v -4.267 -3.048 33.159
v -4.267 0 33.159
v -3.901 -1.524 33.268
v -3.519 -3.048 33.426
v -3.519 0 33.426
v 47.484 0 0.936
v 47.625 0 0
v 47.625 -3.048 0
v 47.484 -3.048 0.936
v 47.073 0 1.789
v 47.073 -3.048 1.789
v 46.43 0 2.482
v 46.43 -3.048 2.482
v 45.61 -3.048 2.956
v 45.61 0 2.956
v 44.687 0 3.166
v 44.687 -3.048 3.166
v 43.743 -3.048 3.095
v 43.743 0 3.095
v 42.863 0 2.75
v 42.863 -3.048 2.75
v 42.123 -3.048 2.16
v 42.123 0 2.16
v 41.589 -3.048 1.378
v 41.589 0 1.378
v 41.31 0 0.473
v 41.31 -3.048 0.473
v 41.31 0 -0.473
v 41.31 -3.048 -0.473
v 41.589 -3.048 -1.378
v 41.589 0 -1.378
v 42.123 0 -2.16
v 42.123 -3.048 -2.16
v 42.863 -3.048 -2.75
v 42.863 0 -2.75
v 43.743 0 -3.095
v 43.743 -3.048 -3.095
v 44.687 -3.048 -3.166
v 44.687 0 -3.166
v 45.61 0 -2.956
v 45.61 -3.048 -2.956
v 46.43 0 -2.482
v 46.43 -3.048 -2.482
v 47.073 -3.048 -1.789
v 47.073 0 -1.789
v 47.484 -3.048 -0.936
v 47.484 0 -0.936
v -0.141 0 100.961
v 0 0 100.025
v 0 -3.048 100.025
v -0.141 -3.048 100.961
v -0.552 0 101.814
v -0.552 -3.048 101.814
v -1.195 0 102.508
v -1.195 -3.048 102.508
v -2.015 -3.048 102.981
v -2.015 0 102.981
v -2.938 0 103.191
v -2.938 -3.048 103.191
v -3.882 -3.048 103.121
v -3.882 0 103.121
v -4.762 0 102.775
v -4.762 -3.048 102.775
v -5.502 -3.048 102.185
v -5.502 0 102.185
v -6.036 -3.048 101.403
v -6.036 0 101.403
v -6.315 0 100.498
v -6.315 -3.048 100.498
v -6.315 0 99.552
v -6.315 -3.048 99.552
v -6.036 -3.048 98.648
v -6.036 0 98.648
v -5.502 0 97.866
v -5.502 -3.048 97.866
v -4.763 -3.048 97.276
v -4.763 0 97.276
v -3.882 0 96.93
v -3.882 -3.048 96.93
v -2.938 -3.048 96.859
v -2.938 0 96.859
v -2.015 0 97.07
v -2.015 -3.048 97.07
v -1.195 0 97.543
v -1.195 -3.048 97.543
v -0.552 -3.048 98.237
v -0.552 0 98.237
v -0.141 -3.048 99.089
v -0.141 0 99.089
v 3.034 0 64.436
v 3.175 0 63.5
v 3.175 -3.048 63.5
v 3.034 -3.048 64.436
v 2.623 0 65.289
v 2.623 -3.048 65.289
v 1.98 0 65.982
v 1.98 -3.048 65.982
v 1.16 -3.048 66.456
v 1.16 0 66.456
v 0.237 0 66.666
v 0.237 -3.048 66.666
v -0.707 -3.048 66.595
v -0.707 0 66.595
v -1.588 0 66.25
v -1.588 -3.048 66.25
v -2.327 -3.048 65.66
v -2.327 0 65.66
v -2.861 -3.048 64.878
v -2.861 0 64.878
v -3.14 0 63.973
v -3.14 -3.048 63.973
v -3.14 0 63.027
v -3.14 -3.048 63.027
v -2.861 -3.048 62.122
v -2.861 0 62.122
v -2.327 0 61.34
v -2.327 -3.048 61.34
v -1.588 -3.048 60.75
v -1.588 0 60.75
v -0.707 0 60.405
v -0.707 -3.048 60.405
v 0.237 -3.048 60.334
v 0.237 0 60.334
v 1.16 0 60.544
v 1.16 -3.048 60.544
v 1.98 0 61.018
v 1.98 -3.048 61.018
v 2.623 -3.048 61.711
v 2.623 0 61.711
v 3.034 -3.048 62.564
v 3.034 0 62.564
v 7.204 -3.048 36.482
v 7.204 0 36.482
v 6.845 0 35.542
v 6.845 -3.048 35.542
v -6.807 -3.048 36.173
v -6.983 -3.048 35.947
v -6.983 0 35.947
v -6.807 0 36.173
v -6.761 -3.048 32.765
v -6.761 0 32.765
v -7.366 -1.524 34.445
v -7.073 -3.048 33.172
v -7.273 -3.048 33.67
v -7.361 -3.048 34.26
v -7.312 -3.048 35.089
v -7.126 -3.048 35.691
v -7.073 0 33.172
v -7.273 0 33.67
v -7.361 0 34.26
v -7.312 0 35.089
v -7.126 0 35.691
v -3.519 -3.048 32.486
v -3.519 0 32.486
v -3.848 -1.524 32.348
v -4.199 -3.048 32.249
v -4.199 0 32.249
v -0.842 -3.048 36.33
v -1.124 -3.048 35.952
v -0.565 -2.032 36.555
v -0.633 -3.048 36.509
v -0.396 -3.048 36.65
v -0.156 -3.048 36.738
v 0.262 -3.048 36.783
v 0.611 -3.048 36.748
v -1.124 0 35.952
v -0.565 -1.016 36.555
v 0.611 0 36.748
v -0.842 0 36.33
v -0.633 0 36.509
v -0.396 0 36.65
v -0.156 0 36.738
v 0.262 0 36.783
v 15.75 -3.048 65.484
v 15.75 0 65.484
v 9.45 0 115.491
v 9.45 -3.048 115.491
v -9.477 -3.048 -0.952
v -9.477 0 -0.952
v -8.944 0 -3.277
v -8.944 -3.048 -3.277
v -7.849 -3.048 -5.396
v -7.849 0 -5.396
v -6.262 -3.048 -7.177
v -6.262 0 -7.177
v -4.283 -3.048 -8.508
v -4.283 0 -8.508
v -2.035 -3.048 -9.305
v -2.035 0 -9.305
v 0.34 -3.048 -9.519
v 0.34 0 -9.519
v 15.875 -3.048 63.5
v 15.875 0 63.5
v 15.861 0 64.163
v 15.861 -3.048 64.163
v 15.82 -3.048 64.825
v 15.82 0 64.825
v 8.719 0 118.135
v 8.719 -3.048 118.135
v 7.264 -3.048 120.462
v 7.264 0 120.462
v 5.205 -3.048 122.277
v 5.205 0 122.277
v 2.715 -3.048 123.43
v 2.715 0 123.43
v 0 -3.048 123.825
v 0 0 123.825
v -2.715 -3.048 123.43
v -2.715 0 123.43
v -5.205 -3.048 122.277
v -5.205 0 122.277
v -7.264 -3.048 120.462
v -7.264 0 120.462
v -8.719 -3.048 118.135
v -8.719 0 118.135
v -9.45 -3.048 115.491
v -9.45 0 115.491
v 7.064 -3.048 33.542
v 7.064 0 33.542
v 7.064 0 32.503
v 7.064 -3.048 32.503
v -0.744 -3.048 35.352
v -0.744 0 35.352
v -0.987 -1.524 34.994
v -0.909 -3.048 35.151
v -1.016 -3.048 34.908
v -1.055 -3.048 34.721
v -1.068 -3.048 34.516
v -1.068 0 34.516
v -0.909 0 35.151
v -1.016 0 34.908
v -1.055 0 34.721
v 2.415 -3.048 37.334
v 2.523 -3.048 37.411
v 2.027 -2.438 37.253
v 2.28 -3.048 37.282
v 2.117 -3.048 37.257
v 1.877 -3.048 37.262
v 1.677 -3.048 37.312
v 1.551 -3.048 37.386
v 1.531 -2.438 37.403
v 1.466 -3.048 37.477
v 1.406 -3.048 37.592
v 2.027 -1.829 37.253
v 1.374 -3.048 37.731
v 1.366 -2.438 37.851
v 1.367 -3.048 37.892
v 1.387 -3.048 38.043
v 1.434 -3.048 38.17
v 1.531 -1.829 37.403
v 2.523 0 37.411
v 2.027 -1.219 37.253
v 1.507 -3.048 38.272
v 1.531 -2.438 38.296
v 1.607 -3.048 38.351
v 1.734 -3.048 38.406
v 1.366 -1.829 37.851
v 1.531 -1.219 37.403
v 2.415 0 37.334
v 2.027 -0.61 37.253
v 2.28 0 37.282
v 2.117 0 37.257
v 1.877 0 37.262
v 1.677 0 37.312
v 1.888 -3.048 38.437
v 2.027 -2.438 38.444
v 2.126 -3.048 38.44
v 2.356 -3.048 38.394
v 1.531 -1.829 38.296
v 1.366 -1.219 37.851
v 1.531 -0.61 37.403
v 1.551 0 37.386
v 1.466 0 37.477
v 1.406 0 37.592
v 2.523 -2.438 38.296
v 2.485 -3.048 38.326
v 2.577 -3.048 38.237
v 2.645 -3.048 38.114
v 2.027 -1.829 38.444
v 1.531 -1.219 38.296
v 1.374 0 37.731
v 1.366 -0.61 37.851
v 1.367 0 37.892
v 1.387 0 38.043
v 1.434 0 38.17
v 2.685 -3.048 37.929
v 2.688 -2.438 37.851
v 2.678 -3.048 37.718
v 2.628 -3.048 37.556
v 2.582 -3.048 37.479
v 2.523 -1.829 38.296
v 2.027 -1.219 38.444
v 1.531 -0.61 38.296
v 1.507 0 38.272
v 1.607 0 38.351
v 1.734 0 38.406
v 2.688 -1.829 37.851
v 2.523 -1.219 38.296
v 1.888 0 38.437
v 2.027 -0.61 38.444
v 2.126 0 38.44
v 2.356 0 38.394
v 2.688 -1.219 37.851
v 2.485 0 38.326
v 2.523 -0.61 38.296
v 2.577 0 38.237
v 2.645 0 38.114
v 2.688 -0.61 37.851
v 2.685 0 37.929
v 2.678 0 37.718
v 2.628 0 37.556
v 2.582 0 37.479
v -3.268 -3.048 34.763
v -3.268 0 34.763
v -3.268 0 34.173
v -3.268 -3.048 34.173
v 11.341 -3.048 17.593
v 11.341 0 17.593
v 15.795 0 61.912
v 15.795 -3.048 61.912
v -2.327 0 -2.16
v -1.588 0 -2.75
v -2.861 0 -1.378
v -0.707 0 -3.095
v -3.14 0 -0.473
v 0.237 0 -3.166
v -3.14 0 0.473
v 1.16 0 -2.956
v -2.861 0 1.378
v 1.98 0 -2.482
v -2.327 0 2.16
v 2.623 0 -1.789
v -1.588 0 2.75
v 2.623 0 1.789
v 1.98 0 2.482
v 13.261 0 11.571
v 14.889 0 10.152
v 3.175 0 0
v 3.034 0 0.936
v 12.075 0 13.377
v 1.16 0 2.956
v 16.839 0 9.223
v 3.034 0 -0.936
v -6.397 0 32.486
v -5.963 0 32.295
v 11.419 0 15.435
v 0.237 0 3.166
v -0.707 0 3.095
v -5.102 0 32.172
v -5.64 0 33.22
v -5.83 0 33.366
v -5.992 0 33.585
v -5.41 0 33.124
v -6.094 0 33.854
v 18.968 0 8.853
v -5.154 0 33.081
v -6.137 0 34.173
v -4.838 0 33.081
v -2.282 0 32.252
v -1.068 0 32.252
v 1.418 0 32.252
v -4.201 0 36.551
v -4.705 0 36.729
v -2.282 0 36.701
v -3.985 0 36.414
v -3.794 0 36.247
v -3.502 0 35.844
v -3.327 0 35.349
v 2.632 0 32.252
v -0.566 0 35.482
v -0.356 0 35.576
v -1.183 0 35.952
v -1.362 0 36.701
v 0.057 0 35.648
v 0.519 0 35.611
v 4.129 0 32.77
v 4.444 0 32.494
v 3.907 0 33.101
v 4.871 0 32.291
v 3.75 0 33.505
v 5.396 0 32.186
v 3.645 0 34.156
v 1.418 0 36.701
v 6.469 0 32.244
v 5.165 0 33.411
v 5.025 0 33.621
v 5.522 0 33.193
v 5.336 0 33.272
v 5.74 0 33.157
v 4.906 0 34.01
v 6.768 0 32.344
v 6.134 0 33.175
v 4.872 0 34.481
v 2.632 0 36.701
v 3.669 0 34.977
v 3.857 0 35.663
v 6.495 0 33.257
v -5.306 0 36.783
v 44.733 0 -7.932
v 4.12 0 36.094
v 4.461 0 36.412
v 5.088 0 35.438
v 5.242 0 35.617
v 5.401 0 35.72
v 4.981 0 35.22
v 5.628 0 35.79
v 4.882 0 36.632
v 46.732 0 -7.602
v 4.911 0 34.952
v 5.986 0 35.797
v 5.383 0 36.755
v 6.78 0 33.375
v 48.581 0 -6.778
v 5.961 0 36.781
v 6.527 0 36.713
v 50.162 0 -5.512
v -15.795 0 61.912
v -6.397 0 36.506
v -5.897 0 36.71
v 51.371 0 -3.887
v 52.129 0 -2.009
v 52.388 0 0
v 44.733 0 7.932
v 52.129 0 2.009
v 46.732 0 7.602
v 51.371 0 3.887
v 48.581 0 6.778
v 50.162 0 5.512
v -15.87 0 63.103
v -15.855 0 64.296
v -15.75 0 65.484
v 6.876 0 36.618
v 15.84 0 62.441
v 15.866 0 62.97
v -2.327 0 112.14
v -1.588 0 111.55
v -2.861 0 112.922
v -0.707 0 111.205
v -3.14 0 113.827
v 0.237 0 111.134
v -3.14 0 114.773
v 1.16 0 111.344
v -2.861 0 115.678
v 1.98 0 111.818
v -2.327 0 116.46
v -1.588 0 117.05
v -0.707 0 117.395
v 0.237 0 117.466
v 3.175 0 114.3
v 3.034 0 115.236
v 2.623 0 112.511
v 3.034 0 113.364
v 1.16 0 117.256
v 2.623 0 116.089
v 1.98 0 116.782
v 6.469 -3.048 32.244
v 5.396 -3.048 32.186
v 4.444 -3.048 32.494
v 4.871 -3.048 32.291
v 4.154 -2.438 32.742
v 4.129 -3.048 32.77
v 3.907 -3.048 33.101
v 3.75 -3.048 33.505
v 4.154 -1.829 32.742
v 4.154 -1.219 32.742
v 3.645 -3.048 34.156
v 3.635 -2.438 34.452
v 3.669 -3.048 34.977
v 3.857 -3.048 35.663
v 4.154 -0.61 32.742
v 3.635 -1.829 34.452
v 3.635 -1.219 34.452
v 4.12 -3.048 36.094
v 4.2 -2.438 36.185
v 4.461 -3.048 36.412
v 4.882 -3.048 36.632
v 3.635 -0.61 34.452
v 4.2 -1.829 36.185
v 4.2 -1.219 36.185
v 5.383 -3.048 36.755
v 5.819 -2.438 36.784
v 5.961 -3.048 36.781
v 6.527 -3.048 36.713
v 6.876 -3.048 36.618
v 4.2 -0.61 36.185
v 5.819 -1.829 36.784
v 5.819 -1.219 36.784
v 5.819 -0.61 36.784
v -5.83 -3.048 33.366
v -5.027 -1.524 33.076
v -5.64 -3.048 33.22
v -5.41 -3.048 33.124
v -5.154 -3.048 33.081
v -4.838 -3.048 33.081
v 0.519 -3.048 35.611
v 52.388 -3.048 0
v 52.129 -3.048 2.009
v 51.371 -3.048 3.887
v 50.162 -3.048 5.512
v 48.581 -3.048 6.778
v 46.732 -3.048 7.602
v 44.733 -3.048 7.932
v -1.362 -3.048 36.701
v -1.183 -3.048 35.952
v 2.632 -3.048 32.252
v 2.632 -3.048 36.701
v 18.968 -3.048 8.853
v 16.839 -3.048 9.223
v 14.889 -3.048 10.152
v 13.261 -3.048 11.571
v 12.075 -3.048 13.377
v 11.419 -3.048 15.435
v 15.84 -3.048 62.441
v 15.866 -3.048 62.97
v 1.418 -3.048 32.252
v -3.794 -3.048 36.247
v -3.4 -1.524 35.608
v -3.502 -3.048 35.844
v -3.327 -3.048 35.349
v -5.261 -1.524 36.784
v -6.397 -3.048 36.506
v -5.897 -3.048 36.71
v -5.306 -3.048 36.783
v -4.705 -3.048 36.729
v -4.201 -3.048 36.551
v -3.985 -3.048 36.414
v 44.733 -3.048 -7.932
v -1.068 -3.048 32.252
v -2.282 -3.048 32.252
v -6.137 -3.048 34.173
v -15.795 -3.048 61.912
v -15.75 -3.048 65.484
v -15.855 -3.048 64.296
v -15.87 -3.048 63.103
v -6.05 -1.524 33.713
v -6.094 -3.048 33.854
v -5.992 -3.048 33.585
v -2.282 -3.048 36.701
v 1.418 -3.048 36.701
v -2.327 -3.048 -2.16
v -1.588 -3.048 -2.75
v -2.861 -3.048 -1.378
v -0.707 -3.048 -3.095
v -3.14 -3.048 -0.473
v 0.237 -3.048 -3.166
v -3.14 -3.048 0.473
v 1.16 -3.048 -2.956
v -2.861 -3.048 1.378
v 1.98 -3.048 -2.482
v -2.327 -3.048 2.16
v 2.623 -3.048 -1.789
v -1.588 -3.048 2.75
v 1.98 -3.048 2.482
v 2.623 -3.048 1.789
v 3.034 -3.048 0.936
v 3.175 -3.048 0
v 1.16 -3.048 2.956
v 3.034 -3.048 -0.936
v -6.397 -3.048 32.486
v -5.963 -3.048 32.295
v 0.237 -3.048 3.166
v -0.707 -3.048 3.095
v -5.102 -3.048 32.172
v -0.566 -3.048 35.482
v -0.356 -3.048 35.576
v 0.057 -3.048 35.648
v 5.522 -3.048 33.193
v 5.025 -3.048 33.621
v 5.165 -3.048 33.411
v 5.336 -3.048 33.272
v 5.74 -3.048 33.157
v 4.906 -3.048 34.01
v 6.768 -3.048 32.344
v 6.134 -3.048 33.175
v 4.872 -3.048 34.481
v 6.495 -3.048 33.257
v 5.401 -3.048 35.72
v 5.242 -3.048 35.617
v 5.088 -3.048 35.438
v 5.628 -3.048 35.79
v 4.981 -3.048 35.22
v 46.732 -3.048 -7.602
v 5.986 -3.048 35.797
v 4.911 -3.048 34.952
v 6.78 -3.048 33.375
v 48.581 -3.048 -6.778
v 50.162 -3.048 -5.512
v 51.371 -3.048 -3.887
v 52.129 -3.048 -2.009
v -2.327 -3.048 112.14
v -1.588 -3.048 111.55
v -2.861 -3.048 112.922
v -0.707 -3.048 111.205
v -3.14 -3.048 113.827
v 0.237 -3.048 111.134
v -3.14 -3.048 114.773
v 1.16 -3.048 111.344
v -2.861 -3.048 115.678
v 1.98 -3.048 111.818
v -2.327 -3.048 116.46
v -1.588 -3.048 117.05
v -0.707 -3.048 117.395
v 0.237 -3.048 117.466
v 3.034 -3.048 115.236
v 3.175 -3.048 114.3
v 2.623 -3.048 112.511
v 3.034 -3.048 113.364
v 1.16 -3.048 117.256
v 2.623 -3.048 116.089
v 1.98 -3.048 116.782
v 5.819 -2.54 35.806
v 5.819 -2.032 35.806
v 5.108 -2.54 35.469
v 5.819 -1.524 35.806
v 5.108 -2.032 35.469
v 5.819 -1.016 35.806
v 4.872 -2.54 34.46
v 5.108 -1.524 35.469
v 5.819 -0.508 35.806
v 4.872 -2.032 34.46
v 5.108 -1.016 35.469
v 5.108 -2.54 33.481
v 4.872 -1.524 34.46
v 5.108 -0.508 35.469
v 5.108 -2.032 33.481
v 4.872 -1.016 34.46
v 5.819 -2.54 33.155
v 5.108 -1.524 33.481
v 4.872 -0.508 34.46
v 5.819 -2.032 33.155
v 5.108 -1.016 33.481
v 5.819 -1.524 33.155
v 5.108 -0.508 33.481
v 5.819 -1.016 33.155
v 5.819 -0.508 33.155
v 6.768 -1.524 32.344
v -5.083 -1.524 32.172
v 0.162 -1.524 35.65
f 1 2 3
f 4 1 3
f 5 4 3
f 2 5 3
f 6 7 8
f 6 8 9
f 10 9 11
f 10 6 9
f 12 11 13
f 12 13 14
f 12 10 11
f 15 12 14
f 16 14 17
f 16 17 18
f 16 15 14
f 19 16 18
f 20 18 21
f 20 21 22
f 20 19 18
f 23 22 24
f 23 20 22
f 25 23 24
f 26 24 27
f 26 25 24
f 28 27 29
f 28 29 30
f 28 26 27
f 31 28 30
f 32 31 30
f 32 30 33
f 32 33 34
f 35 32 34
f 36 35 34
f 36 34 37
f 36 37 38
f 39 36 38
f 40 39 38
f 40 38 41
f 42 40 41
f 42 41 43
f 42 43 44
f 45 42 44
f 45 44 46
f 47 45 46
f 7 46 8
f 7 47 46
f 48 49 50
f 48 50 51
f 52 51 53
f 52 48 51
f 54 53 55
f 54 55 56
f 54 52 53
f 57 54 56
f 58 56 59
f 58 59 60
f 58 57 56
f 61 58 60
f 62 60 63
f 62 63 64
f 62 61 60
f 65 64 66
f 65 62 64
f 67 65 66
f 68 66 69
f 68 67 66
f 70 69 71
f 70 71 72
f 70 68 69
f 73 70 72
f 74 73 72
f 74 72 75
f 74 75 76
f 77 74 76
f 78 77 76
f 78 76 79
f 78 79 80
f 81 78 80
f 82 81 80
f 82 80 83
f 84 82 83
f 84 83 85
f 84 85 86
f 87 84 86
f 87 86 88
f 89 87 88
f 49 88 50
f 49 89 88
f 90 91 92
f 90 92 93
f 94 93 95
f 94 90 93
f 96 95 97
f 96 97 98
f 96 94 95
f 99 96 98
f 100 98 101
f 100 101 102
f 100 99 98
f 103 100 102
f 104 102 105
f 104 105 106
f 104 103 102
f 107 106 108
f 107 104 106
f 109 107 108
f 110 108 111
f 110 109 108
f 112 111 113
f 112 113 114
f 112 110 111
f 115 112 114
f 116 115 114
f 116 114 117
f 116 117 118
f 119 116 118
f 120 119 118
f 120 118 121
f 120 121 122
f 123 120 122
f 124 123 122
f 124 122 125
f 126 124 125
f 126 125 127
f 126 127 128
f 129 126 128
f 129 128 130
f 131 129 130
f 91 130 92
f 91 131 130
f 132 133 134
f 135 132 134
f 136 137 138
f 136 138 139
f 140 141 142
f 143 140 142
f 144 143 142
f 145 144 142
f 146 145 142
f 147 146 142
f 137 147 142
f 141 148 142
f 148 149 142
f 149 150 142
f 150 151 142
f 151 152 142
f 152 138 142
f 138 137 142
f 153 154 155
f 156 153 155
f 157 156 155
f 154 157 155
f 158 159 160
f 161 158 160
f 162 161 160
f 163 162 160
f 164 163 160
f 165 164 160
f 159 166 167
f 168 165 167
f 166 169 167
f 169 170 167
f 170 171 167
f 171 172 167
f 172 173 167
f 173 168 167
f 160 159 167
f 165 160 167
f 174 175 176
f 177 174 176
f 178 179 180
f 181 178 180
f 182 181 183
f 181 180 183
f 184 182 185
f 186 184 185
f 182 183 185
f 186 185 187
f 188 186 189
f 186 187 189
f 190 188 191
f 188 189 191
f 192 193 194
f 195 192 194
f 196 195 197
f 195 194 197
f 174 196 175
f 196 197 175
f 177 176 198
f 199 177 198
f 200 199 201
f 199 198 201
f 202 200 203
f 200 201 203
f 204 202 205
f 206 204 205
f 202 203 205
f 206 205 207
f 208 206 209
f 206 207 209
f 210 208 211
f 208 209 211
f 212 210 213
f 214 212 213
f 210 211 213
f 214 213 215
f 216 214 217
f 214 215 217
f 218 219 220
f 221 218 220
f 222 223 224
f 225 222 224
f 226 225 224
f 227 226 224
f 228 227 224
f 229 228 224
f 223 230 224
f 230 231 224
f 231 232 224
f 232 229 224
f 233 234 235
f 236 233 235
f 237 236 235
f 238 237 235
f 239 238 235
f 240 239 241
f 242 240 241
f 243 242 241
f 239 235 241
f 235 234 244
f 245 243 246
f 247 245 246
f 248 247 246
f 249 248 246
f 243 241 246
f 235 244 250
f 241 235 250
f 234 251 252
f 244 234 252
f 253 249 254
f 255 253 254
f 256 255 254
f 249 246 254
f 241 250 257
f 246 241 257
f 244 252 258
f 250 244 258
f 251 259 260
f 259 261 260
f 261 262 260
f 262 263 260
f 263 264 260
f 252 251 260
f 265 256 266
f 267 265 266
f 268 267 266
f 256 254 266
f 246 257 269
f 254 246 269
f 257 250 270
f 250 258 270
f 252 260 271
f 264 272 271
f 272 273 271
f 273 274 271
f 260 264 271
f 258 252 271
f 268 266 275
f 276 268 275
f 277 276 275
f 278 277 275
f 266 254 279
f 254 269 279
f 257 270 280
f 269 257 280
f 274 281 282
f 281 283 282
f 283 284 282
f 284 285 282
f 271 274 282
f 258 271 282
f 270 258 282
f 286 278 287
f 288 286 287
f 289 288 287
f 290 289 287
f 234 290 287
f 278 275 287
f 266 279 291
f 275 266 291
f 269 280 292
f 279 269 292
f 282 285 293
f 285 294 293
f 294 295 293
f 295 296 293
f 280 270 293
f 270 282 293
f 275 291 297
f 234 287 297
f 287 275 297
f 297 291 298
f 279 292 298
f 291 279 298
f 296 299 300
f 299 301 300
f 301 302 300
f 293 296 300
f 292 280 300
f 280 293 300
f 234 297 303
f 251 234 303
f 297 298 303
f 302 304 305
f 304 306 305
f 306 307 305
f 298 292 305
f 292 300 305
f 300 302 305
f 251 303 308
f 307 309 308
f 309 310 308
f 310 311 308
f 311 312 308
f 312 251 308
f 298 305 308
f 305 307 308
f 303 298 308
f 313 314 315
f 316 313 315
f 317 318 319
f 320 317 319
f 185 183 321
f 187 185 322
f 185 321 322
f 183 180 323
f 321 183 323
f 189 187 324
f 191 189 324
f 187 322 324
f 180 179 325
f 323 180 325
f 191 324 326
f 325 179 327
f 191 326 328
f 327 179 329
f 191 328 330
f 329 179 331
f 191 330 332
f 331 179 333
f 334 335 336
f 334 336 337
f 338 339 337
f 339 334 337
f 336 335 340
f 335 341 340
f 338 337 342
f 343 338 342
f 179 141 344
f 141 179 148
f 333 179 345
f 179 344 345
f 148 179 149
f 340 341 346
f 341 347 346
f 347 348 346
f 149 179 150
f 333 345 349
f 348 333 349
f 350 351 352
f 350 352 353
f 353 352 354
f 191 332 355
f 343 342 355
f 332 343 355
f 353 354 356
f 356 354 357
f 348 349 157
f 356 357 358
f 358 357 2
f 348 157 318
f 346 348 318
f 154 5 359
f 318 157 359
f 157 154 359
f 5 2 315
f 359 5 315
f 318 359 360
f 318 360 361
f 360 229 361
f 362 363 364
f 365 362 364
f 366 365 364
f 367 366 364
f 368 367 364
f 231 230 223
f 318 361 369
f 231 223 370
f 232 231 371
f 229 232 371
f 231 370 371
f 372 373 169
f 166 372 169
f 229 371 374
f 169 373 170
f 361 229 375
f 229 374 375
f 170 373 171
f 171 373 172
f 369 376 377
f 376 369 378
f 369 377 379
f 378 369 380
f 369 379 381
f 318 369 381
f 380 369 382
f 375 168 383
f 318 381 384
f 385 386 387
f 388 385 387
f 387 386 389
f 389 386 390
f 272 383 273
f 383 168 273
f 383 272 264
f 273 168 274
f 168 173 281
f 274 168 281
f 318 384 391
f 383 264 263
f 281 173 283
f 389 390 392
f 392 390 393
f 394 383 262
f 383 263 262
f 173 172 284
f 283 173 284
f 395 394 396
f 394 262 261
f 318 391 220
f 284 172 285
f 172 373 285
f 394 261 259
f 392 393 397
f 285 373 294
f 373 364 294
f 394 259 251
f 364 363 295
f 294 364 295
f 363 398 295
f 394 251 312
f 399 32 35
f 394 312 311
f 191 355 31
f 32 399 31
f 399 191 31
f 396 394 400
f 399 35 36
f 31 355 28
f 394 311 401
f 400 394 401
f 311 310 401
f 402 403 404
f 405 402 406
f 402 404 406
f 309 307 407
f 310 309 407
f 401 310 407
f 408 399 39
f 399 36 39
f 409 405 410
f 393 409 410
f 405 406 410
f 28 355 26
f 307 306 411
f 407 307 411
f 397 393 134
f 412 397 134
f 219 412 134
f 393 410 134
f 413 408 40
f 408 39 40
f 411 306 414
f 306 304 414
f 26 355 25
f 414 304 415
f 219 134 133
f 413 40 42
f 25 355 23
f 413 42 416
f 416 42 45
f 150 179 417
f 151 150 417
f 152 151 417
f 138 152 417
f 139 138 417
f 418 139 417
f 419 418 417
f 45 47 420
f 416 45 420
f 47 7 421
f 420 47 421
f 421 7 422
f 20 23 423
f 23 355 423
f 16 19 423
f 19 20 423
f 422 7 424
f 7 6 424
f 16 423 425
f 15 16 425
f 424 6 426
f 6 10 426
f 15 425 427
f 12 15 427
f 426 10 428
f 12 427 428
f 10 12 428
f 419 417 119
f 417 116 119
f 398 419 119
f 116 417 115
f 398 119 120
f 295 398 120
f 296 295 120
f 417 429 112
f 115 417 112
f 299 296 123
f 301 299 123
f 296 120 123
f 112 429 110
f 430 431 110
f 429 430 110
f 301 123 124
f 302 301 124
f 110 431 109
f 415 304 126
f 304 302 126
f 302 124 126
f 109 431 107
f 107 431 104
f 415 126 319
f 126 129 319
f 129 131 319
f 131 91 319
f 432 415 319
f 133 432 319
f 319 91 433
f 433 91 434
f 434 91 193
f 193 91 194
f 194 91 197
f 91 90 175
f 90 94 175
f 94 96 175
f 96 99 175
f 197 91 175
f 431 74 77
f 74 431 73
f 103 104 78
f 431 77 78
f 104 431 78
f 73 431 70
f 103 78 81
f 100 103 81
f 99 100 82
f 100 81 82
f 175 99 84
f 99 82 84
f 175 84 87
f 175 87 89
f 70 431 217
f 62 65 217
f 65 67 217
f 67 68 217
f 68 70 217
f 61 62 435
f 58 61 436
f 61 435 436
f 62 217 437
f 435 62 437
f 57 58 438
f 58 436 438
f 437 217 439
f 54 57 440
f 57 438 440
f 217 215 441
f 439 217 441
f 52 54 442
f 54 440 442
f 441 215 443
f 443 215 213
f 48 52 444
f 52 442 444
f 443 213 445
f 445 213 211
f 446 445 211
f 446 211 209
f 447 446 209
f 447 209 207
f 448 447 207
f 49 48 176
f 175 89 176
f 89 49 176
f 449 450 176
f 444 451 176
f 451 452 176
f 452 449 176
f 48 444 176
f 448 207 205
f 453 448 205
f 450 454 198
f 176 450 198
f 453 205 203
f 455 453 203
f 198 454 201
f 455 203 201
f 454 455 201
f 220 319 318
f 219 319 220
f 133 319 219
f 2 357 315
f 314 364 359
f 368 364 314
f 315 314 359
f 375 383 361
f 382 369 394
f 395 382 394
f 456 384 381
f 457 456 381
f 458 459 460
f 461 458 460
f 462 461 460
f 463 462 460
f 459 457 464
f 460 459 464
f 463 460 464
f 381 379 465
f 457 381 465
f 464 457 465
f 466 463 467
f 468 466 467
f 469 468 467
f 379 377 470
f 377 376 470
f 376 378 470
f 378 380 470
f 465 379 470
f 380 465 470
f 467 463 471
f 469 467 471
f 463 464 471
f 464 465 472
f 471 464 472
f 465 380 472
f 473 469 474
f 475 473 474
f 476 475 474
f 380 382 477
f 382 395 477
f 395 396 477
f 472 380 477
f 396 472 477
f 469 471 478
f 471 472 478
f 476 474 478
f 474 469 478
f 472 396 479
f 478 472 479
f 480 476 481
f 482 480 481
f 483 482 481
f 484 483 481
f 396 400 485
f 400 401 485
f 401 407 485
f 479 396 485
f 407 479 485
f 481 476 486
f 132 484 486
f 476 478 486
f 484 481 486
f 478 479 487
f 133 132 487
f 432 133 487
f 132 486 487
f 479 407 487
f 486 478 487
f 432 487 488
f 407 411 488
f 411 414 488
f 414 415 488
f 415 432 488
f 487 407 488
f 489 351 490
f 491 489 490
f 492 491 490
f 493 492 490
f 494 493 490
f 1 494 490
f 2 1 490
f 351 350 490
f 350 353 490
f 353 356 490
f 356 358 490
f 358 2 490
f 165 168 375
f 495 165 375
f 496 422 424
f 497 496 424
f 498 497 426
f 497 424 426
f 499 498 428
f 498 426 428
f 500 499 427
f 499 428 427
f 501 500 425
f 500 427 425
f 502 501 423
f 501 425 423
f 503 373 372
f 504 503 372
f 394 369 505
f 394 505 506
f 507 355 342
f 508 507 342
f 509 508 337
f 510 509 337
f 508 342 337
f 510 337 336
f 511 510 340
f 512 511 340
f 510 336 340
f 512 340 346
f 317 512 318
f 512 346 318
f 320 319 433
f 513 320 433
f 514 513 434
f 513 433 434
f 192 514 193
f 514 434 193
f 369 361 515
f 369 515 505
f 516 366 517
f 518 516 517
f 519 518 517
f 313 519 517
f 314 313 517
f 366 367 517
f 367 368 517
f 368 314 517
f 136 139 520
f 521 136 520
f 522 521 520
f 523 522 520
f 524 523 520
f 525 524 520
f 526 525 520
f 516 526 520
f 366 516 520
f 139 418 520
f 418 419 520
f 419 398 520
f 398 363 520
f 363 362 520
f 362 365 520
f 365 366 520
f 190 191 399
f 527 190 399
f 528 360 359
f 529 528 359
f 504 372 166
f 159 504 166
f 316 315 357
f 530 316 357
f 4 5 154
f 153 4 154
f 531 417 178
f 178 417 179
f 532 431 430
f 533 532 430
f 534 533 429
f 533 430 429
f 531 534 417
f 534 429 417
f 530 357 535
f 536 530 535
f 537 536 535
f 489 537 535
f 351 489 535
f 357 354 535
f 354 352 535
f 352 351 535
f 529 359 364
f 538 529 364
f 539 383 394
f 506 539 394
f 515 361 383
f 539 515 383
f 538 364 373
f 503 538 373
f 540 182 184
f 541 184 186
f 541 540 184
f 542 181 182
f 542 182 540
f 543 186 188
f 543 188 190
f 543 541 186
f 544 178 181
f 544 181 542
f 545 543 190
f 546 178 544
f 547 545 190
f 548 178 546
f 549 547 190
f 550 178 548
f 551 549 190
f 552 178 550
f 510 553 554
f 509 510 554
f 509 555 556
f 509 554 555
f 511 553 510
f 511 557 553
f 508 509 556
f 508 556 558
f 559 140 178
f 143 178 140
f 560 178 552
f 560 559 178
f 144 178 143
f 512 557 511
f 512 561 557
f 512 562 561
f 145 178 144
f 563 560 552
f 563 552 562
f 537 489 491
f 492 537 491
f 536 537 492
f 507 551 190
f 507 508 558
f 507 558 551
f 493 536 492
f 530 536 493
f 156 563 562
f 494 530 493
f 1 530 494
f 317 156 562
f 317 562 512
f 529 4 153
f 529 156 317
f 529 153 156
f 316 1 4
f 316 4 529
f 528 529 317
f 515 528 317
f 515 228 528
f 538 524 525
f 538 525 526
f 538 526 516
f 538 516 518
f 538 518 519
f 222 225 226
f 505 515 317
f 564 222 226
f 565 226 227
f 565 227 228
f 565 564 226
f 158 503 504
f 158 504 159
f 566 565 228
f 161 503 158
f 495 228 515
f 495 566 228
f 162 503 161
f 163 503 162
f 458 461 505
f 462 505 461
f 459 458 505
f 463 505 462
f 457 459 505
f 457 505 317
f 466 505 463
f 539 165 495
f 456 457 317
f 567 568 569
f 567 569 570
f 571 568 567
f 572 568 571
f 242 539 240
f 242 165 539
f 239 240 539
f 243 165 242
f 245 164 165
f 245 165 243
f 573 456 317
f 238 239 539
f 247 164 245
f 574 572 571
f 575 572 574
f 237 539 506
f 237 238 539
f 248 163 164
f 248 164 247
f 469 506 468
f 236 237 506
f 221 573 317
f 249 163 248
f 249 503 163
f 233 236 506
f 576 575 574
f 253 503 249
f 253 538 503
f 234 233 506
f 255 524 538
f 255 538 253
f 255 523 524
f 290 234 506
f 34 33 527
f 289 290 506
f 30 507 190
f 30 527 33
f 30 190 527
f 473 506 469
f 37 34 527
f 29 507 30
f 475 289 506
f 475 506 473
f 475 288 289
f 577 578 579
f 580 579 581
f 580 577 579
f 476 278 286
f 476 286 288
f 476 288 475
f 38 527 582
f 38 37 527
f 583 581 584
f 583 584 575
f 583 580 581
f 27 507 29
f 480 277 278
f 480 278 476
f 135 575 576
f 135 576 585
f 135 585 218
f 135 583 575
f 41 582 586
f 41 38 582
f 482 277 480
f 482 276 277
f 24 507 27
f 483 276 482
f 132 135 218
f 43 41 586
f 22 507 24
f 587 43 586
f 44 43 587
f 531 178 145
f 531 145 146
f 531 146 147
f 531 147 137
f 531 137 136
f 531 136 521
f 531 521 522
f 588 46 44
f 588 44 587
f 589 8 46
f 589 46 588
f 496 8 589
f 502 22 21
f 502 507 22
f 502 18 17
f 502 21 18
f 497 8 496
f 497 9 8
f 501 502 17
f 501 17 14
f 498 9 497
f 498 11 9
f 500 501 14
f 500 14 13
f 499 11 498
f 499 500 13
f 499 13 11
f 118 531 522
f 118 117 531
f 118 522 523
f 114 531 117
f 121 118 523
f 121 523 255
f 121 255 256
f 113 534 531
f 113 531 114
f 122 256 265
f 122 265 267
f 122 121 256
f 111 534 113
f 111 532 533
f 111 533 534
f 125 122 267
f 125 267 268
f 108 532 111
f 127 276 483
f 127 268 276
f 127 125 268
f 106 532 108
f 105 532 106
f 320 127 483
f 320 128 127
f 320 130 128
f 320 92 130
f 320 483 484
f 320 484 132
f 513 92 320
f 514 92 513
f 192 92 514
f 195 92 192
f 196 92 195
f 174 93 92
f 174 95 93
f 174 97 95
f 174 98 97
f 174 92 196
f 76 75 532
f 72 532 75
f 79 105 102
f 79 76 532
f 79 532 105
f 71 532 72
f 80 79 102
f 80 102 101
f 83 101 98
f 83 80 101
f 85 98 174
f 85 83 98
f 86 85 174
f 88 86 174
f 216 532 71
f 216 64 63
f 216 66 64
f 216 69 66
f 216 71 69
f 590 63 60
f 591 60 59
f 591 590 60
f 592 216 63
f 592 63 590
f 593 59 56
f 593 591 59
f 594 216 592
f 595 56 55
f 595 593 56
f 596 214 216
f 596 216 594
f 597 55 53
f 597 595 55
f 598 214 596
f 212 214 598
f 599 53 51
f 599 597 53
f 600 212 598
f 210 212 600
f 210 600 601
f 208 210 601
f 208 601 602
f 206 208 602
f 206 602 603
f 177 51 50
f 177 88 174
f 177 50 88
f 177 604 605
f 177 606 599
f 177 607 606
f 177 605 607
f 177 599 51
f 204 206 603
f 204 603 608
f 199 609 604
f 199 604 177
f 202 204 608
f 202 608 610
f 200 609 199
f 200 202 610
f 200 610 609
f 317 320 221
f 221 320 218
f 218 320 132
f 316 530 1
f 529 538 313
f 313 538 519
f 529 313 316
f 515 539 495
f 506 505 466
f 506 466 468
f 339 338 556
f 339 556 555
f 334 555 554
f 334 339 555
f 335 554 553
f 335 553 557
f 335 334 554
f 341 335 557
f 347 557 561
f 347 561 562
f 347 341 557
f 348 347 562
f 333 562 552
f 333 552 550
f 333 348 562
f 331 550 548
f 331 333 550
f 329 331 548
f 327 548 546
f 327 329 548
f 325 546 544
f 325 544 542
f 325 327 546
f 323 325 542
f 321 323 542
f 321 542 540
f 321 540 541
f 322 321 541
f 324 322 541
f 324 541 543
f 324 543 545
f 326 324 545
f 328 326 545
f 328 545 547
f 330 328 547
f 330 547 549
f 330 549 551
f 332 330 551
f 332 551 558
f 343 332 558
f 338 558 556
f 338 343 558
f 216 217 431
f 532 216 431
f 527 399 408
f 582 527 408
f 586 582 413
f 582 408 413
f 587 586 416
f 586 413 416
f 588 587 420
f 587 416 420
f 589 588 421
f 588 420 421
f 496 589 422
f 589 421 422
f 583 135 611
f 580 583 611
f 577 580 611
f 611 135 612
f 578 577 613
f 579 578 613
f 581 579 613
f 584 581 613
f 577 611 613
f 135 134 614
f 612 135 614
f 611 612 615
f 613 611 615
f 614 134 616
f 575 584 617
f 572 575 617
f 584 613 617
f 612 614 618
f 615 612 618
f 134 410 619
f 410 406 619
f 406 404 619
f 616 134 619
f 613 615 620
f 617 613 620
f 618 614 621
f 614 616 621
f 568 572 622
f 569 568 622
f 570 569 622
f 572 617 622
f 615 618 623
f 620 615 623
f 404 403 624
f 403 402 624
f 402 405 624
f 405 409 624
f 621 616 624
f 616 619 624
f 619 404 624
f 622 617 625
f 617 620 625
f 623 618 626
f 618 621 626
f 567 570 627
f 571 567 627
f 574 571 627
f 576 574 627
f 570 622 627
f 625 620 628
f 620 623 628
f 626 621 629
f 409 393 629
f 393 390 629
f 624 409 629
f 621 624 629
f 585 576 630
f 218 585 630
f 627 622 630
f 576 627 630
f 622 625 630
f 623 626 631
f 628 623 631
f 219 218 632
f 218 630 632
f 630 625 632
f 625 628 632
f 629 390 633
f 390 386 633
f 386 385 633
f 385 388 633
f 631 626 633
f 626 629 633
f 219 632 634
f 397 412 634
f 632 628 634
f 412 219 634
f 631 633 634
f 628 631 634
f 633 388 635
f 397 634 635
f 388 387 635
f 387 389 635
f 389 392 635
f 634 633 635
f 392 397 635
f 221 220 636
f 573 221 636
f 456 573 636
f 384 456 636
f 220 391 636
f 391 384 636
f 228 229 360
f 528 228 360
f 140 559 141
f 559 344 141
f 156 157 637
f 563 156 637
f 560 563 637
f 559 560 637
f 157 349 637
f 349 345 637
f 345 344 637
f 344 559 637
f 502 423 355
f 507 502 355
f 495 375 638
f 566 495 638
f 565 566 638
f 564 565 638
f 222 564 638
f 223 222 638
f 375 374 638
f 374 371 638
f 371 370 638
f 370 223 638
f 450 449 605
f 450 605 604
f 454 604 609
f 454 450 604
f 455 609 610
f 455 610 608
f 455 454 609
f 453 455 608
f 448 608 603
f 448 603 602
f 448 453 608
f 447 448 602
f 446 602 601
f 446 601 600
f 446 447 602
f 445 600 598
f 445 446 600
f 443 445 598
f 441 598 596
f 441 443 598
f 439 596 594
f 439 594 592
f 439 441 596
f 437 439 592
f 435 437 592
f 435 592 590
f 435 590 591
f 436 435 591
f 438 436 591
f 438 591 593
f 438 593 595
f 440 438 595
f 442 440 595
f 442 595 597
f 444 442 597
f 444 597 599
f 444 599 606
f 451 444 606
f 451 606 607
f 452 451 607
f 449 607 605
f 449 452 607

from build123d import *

# Parameters (mm, degrees)
F0_R     = 3.175
F0_W     = 1.2134287943
F0_H     = 4.4488144882
F1_DEPTH = 3.048


with BuildPart() as f1:
    # F0 (on Front) → F1 (new body)
    with BuildSketch(Plane.XZ):
        with BuildLine():
            ThreePointArc((44.7334821429, -7.9324362036), (50.1620069047, -5.5115227815), (52.3875, 0))
            ThreePointArc((52.3875, 0), (50.1620069047, 5.5115227815), (44.7334821429, 7.9324362036))
            ThreePointArc((44.7334821429, 7.9324362036), (36.5125, 0), (44.7334821429, -7.9324362036))
        make_face()
        with Locations((44.45, 0)):
            Circle(F0_R, mode=Mode.SUBTRACT)
        with BuildLine():
            ThreePointArc((44.7334821429, -7.9324362036), (36.5125, 0), (44.7334821429, 7.9324362036))
            Line((44.7334821429, 7.9324362036), (18.9676000005, 8.8532337108))
            ThreePointArc((18.9676000005, 8.8532337108), (13.2611998974, 11.5713591498), (11.3411865923, 17.5933818124))
            Line((11.3411865923, 17.5933818124), (15.7954255641, 61.9125))
            ThreePointArc((15.7954255641, 61.9125), (0, 47.625), (-15.7954255641, 61.9125))
            Line((-15.7954255641, 61.9125), (-9.4772553384, -0.9525))
            ThreePointArc((-9.4772553384, -0.9525), (-0.4768479324, 9.5130563464), (9.525, 0))
            ThreePointArc((9.525, 0), (6.8544082857, -6.6138273378), (0.3401785714, -9.5189234444))
            Line((0.3401785714, -9.5189234444), (44.7334821429, -7.9324362036))
        make_face()
        with BuildLine():
            add(Edge.make_bspline(
                [(-4.1992530573, 32.2494809549), (-4.5608624776, 32.1718113259), (-5.0829042464, 32.1718113259)],
                knots=[0, 0, 0, 1, 1, 1], degree=2))
            add(Edge.make_bspline(
                [(-5.0829042464, 32.1718113259), (-6.156273054, 32.1718113259), (-6.7610775422, 32.7651563606)],
                knots=[0, 0, 0, 1, 1, 1], degree=2))
            add(Edge.make_bspline(
                [(-6.7610775422, 32.7651563606), (-7.3658820304, 33.3585013954), (-7.3658820304, 34.444602929)],
                knots=[0, 0, 0, 1, 1, 1], degree=2))
            add(Edge.make_bspline(
                [(-7.3658820304, 34.444602929), (-7.3658820304, 35.5625362778), (-6.806915356, 36.1730704928)],
                knots=[0, 0, 0, 1, 1, 1], degree=2))
            add(Edge.make_bspline(
                [(-6.806915356, 36.1730704928), (-6.2479486816, 36.7836047077), (-5.2611624114, 36.7836047077)],
                knots=[0, 0, 0, 1, 1, 1], degree=2))
            add(Edge.make_bspline(
                [(-5.2611624114, 36.7836047077), (-4.3189406823, 36.7836047077), (-3.793715732, 36.246920304)],
                knots=[0, 0, 0, 1, 1, 1], degree=2))
            add(Edge.make_bspline(
                [(-3.793715732, 36.246920304), (-3.2684907817, 35.7102359002), (-3.2684907817, 34.7629210807)],
                knots=[0, 0, 0, 1, 1, 1], degree=2))
            Line((-3.2684907817, 34.7629210807), (-3.2684907817, 34.1733958638))
            Line((-3.2684907817, 34.1733958638), (-6.1371739649, 34.1733958638))
            add(Edge.make_bspline(
                [(-6.1371739649, 34.1733958638), (-6.1168016031, 33.6564471854), (-5.8303152666, 33.3661410311)],
                knots=[0, 0, 0, 1, 1, 1], degree=2))
            add(Edge.make_bspline(
                [(-5.8303152666, 33.3661410311), (-5.5438289301, 33.0758348767), (-5.0268802517, 33.0758348767)],
                knots=[0, 0, 0, 1, 1, 1], degree=2))
            add(Edge.make_bspline(
                [(-5.0268802517, 33.0758348767), (-4.624526108, 33.0758348767), (-4.2667365054, 33.1592342324)],
                knots=[0, 0, 0, 1, 1, 1], degree=2))
            add(Edge.make_bspline(
                [(-4.2667365054, 33.1592342324), (-3.9089469029, 33.2426335882), (-3.5193254852, 33.4259848436)],
                knots=[0, 0, 0, 1, 1, 1], degree=2))
            Line((-3.5193254852, 33.4259848436), (-3.5193254852, 32.4863096597))
            add(Edge.make_bspline(
                [(-3.5193254852, 32.4863096597), (-3.8376436369, 32.3271505839), (-4.1992530573, 32.2494809549)],
                knots=[0, 0, 0, 1, 1, 1], degree=2))
        make_face(mode=Mode.SUBTRACT)
        with BuildLine():
            add(Edge.make_bspline(
                [(-0.5646964011, 36.5550522748), (-0.2126365253, 36.7836047077), (0.2011770719, 36.7836047077)],
                knots=[0, 0, 0, 1, 1, 1], degree=2))
            add(Edge.make_bspline(
                [(0.2011770719, 36.7836047077), (0.4481919576, 36.7836047077), (0.6111708513, 36.7479530748)],
                knots=[0, 0, 0, 1, 1, 1], degree=2))
            Line((0.6111708513, 36.7479530748), (0.5194952236, 35.6109206369))
            add(Edge.make_bspline(
                [(0.5194952236, 35.6109206369), (0.3717956012, 35.6503920877), (0.1617056211, 35.6503920877)],
                knots=[0, 0, 0, 1, 1, 1], degree=2))
            add(Edge.make_bspline(
                [(0.1617056211, 35.6503920877), (-0.4189066876, 35.6503920877), (-0.7435912024, 35.3518096614)],
                knots=[0, 0, 0, 1, 1, 1], degree=2))
            add(Edge.make_bspline(
                [(-0.7435912024, 35.3518096614), (-1.0682757171, 35.0532272351), (-1.0682757171, 34.515906195)],
                knots=[0, 0, 0, 1, 1, 1], degree=2))
            Line((-1.0682757171, 34.515906195), (-1.0682757171, 32.2520275001))
            Line((-1.0682757171, 32.2520275001), (-2.2817045114, 32.2520275001))
            Line((-2.2817045114, 32.2520275001), (-2.2817045114, 36.7008419883))
            Line((-2.2817045114, 36.7008419883), (-1.3624016893, 36.7008419883))
            Line((-1.3624016893, 36.7008419883), (-1.1828702517, 35.9521576955))
            Line((-1.1828702517, 35.9521576955), (-1.1242997118, 35.9521576955))
            add(Edge.make_bspline(
                [(-1.1242997118, 35.9521576955), (-0.9167562769, 36.3264998419), (-0.5646964011, 36.5550522748)],
                knots=[0, 0, 0, 1, 1, 1], degree=2))
        make_face(mode=Mode.SUBTRACT)
        with Locations((2.0251400811, 34.4764347442)):
            Rectangle(F0_W, F0_H, mode=Mode.SUBTRACT)
        with BuildLine():
            add(Edge.make_bspline(
                [(6.4694981152, 32.2437512281), (6.16900578, 32.1718113259), (5.7119009142, 32.1718113259)],
                knots=[0, 0, 0, 1, 1, 1], degree=2))
            add(Edge.make_bspline(
                [(5.7119009142, 32.1718113259), (3.6351932925, 32.1718113259), (3.6351932925, 34.4522425647)],
                knots=[0, 0, 0, 1, 1, 1], degree=2))
            add(Edge.make_bspline(
                [(3.6351932925, 34.4522425647), (3.6351932925, 35.5867284573), (4.1998896936, 36.1851665825)],
                knots=[0, 0, 0, 1, 1, 1], degree=2))
            add(Edge.make_bspline(
                [(4.1998896936, 36.1851665825), (4.7645860947, 36.7836047077), (5.8188558132, 36.7836047077)],
                knots=[0, 0, 0, 1, 1, 1], degree=2))
            add(Edge.make_bspline(
                [(5.8188558132, 36.7836047077), (6.5904590129, 36.7836047077), (7.2041764094, 36.4818390999)],
                knots=[0, 0, 0, 1, 1, 1], degree=2))
            Line((7.2041764094, 36.4818390999), (6.8451135342, 35.5421639161))
            add(Edge.make_bspline(
                [(6.8451135342, 35.5421639161), (6.5586271977, 35.6580317233), (6.3122489483, 35.7318815345)],
                knots=[0, 0, 0, 1, 1, 1], degree=2))
            add(Edge.make_bspline(
                [(6.3122489483, 35.7318815345), (6.0658706989, 35.8057313457), (5.8188558132, 35.8057313457)],
                knots=[0, 0, 0, 1, 1, 1], degree=2))
            add(Edge.make_bspline(
                [(5.8188558132, 35.8057313457), (4.8715409937, 35.8057313457), (4.8715409937, 34.4598822003)],
                knots=[0, 0, 0, 1, 1, 1], degree=2))
            add(Edge.make_bspline(
                [(4.8715409937, 34.4598822003), (4.8715409937, 33.1547777783), (5.8188558132, 33.1547777783)],
                knots=[0, 0, 0, 1, 1, 1], degree=2))
            add(Edge.make_bspline(
                [(5.8188558132, 33.1547777783), (6.16900578, 33.1547777783), (6.4675882063, 33.2483633149)],
                knots=[0, 0, 0, 1, 1, 1], degree=2))
            add(Edge.make_bspline(
                [(6.4675882063, 33.2483633149), (6.7661706326, 33.3419488515), (7.0641164226, 33.5418526508)],
                knots=[0, 0, 0, 1, 1, 1], degree=2))
            Line((7.0641164226, 33.5418526508), (7.0641164226, 32.5028622036))
            add(Edge.make_bspline(
                [(7.0641164226, 32.5028622036), (6.7699904504, 32.3156911304), (6.4694981152, 32.2437512281)],
                knots=[0, 0, 0, 1, 1, 1], degree=2))
        make_face(mode=Mode.SUBTRACT)
        with BuildLine():
            add(Edge.make_bspline(
                [(2.0270499901, 37.2534422997), (1.3662215071, 37.2534422997), (1.3662215071, 37.8506071523)],
                knots=[0, 0, 0, 1, 1, 1], degree=2))
            add(Edge.make_bspline(
                [(1.3662215071, 37.8506071523), (1.3662215071, 38.443952187), (2.0270499901, 38.443952187)],
                knots=[0, 0, 0, 1, 1, 1], degree=2))
            add(Edge.make_bspline(
                [(2.0270499901, 38.443952187), (2.687878473, 38.443952187), (2.687878473, 37.8506071523)],
                knots=[0, 0, 0, 1, 1, 1], degree=2))
            add(Edge.make_bspline(
                [(2.687878473, 37.8506071523), (2.687878473, 37.5679406335), (2.5229896704, 37.4106914666)],
                knots=[0, 0, 0, 1, 1, 1], degree=2))
            add(Edge.make_bspline(
                [(2.5229896704, 37.4106914666), (2.3581008678, 37.2534422997), (2.0270499901, 37.2534422997)],
                knots=[0, 0, 0, 1, 1, 1], degree=2))
        make_face(mode=Mode.SUBTRACT)
        with BuildLine():
            ThreePointArc((-9.4772553384, -0.9525), (-6.2623833816, -7.1769199091), (0.3401785714, -9.5189234444))
            ThreePointArc((0.3401785714, -9.5189234444), (6.8544082857, -6.6138273378), (9.525, 0))
            ThreePointArc((9.525, 0), (-0.4768479324, 9.5130563464), (-9.4772553384, -0.9525))
        make_face()
        Circle(F0_R, mode=Mode.SUBTRACT)
        with BuildLine():
            ThreePointArc((-15.7954255641, 61.9125), (0, 47.625), (15.7954255641, 61.9125))
            ThreePointArc((15.7954255641, 61.9125), (15.8550939106, 62.7052534459), (15.875, 63.5))
            ThreePointArc((15.875, 63.5), (15.8438414904, 64.4941387366), (15.7504882737, 65.484375))
            ThreePointArc((15.7504882737, 65.484375), (0, 79.375), (-15.7504882737, 65.484375))
            ThreePointArc((-15.7504882737, 65.484375), (-15.8737438155, 63.6997054867), (-15.7954255641, 61.9125))
        make_face()
        with Locations((0, 63.5)):
            Circle(F0_R, mode=Mode.SUBTRACT)
        with BuildLine():
            Line((-9.4502929642, 115.490625), (-15.7504882737, 65.484375))
            ThreePointArc((-15.7504882737, 65.484375), (0, 79.375), (15.7504882737, 65.484375))
            Line((15.7504882737, 65.484375), (9.4502929642, 115.490625))
            ThreePointArc((9.4502929642, 115.490625), (9.5063048942, 114.896483242), (9.525, 114.3))
            ThreePointArc((9.525, 114.3), (-0.596483242, 104.7936951058), (-9.4502929642, 115.490625))
        make_face()
        with Locations((-3.175, 100.0252)):
            Circle(F0_R, mode=Mode.SUBTRACT)
        with BuildLine():
            ThreePointArc((9.4502929642, 115.490625), (0, 123.825), (-9.4502929642, 115.490625))
            ThreePointArc((-9.4502929642, 115.490625), (-0.596483242, 104.7936951058), (9.525, 114.3))
            ThreePointArc((9.525, 114.3), (9.5063048942, 114.896483242), (9.4502929642, 115.490625))
        make_face()
        with Locations((0, 114.3)):
            Circle(F0_R, mode=Mode.SUBTRACT)
    extrude(amount=F1_DEPTH)


solid = f1.part
